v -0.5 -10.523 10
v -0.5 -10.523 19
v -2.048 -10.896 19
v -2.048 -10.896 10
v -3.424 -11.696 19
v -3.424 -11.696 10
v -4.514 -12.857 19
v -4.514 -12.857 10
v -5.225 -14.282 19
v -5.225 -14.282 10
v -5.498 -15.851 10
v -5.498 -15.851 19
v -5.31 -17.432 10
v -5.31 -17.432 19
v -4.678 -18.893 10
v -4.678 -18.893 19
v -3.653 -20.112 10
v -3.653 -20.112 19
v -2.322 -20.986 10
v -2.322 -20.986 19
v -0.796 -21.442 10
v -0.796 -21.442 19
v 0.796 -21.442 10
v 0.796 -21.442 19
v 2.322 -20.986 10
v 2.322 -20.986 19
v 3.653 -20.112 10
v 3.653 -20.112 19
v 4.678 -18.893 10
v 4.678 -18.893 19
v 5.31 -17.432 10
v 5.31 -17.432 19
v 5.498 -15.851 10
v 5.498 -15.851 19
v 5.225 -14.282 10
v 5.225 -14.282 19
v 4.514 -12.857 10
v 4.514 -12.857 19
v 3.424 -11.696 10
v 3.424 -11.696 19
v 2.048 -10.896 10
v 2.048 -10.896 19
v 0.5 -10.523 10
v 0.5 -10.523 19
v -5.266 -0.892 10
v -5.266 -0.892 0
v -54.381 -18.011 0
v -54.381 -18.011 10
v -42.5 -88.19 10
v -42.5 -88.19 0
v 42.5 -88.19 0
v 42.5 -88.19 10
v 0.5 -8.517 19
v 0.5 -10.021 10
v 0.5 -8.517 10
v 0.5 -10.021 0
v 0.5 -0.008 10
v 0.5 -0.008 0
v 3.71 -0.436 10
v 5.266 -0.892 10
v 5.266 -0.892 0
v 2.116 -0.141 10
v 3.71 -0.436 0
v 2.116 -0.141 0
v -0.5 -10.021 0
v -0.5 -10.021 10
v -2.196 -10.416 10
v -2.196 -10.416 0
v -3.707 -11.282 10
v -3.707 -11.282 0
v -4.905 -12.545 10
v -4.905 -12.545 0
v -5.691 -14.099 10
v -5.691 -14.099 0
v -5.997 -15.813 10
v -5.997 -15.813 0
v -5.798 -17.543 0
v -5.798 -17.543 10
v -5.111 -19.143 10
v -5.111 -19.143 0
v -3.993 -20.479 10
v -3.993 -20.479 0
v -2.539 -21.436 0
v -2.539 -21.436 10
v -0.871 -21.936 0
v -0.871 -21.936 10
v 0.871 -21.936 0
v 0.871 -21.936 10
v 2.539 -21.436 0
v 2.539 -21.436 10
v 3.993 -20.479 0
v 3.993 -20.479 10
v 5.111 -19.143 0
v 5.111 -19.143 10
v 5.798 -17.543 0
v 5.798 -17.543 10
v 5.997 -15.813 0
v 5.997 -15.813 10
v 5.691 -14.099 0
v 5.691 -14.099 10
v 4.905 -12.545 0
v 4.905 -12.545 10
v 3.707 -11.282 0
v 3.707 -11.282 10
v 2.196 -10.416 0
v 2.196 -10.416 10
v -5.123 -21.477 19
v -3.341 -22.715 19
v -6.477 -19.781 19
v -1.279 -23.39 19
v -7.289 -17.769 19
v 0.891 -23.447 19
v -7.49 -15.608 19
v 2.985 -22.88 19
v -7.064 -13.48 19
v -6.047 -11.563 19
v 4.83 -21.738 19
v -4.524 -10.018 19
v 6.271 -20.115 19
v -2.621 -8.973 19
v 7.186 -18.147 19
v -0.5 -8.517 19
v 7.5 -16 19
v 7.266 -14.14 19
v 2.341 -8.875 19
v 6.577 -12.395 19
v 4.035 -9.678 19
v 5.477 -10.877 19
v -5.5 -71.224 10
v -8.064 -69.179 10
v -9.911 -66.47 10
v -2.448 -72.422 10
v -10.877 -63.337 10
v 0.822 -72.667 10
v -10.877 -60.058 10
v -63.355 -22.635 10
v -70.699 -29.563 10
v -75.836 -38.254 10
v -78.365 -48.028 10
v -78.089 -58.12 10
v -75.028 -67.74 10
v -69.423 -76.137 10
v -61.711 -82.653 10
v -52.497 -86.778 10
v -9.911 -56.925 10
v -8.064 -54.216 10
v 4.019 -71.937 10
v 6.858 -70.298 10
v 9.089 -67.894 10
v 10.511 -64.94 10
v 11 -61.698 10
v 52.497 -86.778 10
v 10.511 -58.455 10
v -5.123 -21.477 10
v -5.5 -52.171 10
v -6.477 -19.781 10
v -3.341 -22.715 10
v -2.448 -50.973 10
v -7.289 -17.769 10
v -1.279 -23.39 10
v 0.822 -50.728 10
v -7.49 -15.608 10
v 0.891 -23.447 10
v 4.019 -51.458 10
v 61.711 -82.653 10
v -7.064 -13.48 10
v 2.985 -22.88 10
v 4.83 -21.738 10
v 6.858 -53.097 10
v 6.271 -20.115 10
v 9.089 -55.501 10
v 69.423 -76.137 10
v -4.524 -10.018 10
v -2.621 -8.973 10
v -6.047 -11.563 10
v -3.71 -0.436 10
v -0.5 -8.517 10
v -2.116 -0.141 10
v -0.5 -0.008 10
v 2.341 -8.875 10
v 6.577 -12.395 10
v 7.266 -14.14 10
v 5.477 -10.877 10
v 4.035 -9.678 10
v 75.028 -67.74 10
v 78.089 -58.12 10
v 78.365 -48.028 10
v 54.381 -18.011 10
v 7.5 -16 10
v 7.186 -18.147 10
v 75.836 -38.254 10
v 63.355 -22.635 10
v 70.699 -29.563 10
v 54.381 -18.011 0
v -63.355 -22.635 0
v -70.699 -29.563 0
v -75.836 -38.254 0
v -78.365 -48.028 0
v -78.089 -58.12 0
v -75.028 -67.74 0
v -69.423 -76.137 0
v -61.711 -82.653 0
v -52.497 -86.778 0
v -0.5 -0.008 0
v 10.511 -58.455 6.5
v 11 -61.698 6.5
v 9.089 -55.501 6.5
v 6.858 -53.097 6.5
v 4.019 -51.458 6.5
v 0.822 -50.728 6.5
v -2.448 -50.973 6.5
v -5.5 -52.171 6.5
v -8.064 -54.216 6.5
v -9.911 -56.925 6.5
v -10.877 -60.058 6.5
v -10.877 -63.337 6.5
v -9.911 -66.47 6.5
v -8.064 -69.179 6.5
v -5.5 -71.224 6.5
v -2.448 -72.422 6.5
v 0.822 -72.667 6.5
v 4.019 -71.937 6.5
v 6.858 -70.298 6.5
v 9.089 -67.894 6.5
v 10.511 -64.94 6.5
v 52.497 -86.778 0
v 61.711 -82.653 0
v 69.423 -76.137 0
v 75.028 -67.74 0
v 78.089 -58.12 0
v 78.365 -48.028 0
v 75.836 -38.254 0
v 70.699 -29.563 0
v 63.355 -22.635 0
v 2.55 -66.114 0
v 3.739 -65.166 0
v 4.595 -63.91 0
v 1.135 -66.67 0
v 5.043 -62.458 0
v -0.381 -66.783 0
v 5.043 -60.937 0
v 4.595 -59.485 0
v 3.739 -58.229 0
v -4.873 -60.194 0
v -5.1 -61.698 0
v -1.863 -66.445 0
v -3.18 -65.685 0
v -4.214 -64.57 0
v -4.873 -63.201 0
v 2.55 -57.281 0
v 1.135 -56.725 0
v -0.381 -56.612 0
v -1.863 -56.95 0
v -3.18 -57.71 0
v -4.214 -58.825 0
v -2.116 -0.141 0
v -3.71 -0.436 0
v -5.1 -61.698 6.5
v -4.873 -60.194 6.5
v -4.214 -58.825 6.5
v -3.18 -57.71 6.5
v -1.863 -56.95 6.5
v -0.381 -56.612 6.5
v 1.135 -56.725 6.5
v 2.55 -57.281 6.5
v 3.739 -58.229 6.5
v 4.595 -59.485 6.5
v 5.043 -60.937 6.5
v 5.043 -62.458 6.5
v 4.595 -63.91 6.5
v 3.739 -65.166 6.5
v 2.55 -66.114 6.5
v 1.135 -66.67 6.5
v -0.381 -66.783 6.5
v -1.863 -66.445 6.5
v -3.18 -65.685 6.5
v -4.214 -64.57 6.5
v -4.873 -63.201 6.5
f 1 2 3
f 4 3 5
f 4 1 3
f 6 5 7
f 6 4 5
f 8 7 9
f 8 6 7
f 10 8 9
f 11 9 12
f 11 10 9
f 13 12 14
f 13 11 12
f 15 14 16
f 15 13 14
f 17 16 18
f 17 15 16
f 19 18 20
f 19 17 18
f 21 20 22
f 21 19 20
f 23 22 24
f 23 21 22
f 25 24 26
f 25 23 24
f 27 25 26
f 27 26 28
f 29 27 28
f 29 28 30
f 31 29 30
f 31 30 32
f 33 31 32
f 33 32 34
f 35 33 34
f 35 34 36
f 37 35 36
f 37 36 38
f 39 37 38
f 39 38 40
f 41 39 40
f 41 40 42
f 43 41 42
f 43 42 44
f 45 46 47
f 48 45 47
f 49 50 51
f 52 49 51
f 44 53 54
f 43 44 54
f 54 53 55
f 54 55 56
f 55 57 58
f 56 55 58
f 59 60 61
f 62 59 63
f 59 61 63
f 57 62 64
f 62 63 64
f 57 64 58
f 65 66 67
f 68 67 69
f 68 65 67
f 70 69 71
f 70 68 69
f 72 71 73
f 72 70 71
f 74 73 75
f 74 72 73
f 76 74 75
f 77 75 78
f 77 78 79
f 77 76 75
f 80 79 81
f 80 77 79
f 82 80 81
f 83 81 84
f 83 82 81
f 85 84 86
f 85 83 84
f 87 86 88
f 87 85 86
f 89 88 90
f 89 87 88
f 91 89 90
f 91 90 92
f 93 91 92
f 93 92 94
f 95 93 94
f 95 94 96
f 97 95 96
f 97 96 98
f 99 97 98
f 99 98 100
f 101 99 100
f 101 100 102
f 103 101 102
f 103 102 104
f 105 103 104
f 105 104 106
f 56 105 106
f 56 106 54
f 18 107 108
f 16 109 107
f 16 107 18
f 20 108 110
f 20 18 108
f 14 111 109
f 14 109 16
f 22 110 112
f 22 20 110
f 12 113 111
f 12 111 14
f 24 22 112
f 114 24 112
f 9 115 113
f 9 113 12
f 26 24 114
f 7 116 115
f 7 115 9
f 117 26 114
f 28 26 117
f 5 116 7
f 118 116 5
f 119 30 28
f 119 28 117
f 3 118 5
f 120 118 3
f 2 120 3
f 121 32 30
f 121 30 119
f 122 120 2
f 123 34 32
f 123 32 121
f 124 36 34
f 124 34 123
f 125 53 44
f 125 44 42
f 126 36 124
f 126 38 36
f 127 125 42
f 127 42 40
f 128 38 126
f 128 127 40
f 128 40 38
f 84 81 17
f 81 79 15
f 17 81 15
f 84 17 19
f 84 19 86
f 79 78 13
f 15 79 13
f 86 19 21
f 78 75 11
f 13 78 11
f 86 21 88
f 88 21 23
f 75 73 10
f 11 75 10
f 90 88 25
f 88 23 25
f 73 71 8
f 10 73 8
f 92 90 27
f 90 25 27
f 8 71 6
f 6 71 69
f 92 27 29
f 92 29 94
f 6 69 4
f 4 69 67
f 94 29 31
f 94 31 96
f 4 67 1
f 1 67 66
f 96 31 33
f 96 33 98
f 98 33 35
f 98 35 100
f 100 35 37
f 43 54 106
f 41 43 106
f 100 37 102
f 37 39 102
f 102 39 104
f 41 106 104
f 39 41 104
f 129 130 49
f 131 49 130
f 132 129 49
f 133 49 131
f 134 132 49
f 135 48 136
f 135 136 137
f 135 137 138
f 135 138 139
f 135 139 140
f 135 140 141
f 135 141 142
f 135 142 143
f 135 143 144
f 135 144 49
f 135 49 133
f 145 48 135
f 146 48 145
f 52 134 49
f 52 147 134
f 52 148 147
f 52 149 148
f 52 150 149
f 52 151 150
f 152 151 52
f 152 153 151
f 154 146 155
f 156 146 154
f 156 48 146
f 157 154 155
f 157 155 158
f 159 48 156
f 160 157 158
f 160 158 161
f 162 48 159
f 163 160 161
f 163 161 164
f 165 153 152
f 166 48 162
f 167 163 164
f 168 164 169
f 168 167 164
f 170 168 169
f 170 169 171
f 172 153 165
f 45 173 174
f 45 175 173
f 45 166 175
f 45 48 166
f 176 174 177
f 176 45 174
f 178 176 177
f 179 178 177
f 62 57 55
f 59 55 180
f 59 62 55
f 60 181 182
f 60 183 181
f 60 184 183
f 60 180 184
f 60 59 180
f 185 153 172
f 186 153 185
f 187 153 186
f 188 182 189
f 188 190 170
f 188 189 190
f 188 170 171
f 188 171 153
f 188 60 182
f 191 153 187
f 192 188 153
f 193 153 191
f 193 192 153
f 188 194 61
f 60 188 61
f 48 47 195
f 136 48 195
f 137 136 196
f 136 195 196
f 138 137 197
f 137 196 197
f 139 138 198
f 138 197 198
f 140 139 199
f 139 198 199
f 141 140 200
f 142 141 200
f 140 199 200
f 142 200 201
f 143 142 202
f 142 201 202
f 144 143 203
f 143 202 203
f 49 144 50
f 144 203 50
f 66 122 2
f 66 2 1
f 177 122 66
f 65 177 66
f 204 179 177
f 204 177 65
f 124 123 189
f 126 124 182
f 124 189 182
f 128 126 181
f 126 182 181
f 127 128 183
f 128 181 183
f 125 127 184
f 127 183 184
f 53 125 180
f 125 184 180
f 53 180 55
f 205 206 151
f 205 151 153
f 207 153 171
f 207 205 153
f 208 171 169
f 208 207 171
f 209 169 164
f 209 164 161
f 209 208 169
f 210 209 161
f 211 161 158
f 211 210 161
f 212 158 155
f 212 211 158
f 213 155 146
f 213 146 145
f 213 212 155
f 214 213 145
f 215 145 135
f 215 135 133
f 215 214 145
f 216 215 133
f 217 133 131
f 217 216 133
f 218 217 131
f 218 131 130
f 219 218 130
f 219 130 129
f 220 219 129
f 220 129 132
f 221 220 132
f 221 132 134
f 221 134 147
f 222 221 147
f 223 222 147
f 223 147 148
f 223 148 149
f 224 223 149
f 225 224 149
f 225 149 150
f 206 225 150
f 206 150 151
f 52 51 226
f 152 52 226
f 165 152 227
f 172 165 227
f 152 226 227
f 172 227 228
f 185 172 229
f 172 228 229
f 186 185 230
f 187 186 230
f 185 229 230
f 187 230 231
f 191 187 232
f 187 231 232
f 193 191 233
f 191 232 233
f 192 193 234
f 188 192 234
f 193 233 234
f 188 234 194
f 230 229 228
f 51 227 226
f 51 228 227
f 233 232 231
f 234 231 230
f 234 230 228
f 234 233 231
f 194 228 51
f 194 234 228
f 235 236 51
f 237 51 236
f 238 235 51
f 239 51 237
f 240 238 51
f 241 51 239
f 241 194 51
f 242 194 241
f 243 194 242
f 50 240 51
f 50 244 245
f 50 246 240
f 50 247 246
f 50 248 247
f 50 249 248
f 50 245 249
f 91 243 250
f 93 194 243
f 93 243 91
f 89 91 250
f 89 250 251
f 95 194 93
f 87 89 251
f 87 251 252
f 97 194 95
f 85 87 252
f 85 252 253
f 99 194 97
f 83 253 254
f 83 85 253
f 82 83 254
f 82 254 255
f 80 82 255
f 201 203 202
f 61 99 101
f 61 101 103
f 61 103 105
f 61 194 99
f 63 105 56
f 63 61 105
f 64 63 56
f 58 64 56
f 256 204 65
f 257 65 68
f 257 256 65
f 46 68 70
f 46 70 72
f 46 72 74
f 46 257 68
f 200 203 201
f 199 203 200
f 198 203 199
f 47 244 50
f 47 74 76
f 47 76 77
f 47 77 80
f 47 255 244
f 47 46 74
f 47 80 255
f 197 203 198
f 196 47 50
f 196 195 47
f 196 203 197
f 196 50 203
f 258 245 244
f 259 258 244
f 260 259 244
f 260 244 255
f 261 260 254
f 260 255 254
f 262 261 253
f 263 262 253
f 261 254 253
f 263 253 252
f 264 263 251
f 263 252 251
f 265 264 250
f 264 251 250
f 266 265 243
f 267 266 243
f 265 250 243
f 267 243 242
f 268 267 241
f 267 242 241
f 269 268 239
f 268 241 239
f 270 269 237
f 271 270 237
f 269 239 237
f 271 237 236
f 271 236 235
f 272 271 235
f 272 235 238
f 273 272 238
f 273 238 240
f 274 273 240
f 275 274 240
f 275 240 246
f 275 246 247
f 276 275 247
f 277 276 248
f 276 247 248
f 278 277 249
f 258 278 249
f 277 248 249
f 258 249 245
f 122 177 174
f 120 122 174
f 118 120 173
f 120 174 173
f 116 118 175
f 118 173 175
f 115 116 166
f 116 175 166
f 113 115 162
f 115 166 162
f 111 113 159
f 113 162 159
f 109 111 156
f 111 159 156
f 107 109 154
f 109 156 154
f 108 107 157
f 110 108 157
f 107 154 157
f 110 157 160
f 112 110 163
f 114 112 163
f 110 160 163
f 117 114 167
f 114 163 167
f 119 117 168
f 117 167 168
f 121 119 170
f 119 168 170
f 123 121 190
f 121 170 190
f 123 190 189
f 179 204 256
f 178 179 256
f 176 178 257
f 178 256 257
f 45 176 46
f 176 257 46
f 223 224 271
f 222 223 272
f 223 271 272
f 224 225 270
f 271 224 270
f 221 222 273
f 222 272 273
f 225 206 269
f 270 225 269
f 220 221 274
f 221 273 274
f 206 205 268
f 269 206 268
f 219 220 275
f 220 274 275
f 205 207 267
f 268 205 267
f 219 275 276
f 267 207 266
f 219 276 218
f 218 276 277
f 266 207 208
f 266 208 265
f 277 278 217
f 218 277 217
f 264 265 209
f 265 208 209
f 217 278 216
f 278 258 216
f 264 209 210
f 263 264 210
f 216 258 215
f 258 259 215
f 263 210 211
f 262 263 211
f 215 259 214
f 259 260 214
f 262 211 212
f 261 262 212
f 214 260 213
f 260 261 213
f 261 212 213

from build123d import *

# Parameters (mm, degrees)
SKETCH1_R           = 6
SKETCH1_R_2         = 11
BOSS_EXTRUDE1_DEPTH = 10
SKETCH2_R           = 7.5
SKETCH2_R_2         = 5.5
BOSS_EXTRUDE2_DEPTH = 9
SKETCH3_R           = 11
SKETCH3_R_2         = 5.1
BOSS_EXTRUDE3_DEPTH = 6.5
SKETCH4_W           = 1
SKETCH4_H           = 19
CUT_EXTRUDE1_DEPTH  = 14


with BuildPart() as part:
    # Sketch1 → Boss-Extrude1 (new body)
    with BuildSketch(Plane.XY):
        with BuildLine():
            Line((54.380555702, -18.011258697), (5.266349667, -0.891540079))
            ThreePointArc((5.266349667, -0.891540079), (0, 0), (-5.266349667, -0.891540079))
            Line((-5.266349667, -0.891540079), (-54.380555702, -18.011258697))
            ThreePointArc((-54.380555702, -18.011258697), (-78.08863349, -58.119798033), (-42.5, -88.19))
            Line((-42.5, -88.19), (42.5, -88.19))
            ThreePointArc((42.5, -88.19), (78.08863349, -58.119798033), (54.380555702, -18.011258697))
        make_face()
        with Locations((0, -16)):
            Circle(SKETCH1_R, mode=Mode.SUBTRACT)
        with Locations((0, -61.697507746)):
            Circle(SKETCH1_R_2, mode=Mode.SUBTRACT)
    extrude(amount=BOSS_EXTRUDE1_DEPTH)

    # Sketch2 → Boss-Extrude2 (add)
    with BuildSketch(Plane.XY.offset(10)):
        with Locations((0, -16)):
            Circle(SKETCH2_R)
        with Locations((0, -16)):
            Circle(SKETCH2_R_2, mode=Mode.SUBTRACT)
    extrude(amount=BOSS_EXTRUDE2_DEPTH)

    # Sketch3 → Boss-Extrude3 (add)
    with BuildSketch(Plane(origin=(0, 0, 0), x_dir=(-1, 0, 0), z_dir=(0, 0, -1))):
        with Locations((0, -61.697507746)):
            Circle(SKETCH3_R)
        with Locations((0, -61.697507746)):
            Circle(SKETCH3_R_2, mode=Mode.SUBTRACT)
    extrude(amount=-BOSS_EXTRUDE3_DEPTH)

    # Sketch4 → Cut-Extrude1 (cut)
    with BuildSketch(Plane(origin=(0, 1.81, 0), x_dir=(-1, 0, 0), z_dir=(0, -1, 0))):
        with Locations((0, -9.5)):
            Rectangle(SKETCH4_W, SKETCH4_H)
    extrude(amount=CUT_EXTRUDE1_DEPTH, mode=Mode.SUBTRACT)


solid = part.part
